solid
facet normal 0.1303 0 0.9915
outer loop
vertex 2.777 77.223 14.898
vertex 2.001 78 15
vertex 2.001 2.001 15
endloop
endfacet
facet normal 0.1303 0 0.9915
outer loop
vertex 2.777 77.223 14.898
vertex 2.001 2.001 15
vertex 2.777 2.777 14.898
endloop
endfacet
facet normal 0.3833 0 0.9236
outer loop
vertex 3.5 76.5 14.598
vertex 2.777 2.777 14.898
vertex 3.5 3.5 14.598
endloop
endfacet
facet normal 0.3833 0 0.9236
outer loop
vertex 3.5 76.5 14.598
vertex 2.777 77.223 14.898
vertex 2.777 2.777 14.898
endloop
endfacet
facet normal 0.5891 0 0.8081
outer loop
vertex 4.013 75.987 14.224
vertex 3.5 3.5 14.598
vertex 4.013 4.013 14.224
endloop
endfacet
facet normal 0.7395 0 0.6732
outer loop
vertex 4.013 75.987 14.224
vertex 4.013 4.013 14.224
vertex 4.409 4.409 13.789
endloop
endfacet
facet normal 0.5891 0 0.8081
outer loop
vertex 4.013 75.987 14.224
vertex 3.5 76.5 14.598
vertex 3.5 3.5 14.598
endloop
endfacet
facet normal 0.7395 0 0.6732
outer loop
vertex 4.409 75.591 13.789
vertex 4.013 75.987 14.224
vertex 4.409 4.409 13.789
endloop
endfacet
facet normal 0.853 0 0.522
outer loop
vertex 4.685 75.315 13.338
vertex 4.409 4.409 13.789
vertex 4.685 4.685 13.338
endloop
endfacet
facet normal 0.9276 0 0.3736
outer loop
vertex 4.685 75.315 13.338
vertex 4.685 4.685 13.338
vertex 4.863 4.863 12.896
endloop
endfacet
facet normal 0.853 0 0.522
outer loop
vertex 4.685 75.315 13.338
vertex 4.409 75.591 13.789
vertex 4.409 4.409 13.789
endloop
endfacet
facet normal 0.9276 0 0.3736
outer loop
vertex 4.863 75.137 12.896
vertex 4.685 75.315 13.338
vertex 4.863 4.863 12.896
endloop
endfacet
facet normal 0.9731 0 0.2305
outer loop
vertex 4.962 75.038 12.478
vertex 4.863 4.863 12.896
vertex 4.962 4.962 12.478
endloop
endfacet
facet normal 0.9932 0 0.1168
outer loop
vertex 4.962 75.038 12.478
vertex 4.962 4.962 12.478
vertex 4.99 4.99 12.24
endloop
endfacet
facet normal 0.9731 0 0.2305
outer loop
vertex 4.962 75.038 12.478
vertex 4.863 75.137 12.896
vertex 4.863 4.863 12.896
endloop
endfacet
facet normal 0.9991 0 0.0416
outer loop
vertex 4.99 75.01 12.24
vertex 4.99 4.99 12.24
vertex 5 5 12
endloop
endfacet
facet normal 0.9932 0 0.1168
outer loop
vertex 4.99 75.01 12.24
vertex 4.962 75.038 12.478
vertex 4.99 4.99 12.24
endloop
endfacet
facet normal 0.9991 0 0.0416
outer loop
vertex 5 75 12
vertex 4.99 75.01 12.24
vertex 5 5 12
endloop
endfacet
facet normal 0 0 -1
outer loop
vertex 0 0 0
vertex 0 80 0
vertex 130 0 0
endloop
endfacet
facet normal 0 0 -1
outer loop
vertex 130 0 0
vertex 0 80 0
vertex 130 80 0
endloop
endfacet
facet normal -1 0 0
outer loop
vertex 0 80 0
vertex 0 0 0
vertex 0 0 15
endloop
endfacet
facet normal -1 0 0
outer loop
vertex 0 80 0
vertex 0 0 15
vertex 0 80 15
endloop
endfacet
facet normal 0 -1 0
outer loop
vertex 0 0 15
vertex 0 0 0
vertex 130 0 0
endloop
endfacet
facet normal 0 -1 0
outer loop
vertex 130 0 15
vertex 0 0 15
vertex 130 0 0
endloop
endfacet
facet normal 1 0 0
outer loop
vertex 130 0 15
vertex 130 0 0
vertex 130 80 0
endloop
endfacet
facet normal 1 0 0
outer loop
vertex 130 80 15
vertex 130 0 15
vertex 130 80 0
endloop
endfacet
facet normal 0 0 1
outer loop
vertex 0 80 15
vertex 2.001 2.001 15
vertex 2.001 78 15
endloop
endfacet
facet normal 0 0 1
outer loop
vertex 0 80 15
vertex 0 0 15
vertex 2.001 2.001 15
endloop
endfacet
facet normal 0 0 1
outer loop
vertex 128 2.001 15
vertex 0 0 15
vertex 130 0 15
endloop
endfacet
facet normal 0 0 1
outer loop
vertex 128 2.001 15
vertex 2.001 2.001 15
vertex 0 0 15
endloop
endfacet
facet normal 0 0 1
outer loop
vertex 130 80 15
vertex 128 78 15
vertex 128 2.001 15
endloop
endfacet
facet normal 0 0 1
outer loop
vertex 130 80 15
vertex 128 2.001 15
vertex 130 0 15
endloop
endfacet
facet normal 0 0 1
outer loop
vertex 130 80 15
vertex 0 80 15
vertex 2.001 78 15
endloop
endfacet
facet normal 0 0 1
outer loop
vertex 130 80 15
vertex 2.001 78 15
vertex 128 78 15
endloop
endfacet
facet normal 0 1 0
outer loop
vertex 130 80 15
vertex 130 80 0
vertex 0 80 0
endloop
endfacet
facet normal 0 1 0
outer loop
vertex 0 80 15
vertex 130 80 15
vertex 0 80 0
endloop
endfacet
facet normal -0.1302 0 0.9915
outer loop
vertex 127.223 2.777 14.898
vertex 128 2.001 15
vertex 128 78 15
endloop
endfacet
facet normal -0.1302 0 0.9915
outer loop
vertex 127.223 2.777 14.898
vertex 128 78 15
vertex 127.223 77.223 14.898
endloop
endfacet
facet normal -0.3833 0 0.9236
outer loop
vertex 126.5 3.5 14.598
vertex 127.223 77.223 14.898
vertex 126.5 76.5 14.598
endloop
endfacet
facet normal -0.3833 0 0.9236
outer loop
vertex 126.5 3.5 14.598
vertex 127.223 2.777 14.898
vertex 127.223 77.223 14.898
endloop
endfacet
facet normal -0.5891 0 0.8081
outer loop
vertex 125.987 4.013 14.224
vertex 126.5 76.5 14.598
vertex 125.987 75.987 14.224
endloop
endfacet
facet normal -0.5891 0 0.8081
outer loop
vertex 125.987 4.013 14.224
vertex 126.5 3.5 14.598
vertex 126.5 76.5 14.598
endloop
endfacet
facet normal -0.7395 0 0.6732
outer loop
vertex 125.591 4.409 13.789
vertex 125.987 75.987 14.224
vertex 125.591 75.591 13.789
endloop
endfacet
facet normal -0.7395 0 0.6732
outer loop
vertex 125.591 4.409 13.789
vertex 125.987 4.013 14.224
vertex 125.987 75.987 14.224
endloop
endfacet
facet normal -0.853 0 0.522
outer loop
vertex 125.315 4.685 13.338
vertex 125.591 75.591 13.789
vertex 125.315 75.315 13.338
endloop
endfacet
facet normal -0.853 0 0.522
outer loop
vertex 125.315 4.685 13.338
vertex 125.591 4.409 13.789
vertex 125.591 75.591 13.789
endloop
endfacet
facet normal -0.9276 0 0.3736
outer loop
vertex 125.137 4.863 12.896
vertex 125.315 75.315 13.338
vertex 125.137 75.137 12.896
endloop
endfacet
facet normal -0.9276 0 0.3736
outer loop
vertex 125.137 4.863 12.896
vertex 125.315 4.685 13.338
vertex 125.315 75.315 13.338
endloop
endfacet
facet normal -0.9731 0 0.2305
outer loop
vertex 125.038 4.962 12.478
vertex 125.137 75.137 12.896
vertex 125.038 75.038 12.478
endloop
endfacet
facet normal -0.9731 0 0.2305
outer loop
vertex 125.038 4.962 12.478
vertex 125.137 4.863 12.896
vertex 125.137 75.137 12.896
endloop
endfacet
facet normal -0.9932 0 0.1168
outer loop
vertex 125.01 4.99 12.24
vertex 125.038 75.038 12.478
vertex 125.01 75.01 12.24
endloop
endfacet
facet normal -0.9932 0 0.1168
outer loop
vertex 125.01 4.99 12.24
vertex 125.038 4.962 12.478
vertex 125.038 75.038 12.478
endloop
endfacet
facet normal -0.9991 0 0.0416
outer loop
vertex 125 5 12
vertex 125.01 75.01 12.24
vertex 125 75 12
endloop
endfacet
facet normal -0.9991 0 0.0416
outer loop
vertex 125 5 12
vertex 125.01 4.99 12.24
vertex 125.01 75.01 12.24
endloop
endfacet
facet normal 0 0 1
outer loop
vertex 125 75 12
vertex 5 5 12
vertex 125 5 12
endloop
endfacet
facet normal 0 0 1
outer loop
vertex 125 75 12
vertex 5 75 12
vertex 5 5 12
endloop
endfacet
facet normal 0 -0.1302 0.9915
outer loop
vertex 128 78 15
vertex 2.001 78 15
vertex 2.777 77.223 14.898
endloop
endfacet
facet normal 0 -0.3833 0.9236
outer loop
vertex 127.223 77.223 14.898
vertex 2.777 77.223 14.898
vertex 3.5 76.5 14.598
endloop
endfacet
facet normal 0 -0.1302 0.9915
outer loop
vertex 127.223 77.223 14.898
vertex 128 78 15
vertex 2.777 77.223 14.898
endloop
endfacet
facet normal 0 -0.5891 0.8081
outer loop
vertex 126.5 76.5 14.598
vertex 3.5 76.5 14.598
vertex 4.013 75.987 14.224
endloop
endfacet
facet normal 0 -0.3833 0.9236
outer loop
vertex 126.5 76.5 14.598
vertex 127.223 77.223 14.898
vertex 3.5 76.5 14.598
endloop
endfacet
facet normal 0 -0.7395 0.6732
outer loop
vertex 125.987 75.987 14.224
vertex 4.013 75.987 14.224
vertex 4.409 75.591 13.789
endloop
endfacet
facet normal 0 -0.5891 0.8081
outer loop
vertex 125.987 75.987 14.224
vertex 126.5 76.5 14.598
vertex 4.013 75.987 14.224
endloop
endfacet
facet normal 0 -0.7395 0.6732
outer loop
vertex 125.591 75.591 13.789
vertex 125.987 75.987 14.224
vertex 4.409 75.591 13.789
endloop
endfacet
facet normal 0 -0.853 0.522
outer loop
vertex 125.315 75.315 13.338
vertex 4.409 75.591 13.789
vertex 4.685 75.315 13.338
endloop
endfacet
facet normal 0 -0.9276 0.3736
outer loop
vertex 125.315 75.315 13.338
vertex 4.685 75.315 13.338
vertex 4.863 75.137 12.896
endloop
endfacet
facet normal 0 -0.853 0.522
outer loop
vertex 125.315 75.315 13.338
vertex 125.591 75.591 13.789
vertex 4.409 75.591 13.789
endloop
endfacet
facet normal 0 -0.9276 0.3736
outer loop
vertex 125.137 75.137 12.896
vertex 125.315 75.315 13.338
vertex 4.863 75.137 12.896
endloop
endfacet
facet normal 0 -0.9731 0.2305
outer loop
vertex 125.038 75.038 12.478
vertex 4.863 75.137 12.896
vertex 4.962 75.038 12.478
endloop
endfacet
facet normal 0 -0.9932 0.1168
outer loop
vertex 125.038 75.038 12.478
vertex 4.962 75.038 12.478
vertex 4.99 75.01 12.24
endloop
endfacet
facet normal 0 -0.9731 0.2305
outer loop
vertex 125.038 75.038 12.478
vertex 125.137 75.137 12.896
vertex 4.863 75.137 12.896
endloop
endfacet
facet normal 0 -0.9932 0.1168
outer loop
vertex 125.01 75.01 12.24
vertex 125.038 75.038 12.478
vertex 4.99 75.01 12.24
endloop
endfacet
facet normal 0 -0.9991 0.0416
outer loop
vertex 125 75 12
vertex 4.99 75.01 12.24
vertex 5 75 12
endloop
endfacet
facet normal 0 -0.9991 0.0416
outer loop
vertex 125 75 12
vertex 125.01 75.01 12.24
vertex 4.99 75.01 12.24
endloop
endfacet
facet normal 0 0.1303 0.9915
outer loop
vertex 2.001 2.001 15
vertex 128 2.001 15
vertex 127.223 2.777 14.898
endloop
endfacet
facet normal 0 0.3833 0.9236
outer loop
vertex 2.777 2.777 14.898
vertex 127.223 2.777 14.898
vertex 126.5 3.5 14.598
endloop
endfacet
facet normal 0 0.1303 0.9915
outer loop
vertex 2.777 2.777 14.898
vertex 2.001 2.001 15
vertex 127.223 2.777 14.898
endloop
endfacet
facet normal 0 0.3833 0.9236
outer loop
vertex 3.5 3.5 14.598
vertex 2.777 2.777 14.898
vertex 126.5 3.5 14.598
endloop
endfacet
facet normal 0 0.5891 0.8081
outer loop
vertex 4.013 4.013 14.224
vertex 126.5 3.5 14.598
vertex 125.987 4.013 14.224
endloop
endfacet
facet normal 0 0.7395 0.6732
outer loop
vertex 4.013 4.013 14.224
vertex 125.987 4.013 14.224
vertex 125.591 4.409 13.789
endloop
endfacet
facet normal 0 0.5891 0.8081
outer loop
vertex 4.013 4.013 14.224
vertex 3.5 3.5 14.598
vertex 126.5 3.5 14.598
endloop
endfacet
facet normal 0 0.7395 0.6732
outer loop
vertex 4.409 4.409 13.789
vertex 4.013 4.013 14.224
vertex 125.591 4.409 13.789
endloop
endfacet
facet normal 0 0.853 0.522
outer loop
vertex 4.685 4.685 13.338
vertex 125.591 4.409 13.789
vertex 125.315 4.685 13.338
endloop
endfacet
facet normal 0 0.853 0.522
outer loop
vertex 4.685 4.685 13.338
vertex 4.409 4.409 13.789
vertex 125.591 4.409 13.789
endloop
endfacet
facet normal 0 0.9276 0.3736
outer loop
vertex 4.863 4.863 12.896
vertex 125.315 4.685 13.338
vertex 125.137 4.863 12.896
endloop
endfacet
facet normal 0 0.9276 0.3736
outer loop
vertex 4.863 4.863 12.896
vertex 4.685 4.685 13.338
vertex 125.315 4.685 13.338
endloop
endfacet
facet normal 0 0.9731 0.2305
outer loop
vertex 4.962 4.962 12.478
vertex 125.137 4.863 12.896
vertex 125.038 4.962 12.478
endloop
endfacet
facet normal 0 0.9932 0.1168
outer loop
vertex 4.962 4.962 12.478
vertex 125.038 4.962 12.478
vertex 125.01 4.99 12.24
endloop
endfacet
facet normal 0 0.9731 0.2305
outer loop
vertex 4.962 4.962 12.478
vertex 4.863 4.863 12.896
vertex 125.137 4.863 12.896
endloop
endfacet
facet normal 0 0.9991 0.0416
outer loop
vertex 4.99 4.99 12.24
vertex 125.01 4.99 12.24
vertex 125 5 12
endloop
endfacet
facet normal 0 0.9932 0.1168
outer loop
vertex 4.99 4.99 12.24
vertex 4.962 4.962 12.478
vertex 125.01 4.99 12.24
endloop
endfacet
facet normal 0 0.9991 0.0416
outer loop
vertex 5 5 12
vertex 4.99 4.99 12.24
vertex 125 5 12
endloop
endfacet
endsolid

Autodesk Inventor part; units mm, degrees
ref_plane "YZ Plane" through (0, 0, 0) normal (1, 0, 0) x (0, 1, 0)
ref_plane "XZ Plane" through (0, 0, 0) normal (0, 1, 0) x (-1, 0, 0)
ref_plane "XY Plane" through (0, 0, 0) normal (0, 0, 1) x (1, 0, 0)
sketch "Skizze2" plane through (0, 0, 0) normal (0, 0, 1) x (1, 0, 0)
  line L0 (-26, 0) -> (156, 0) projected
  line L1 (0, -16) -> (0, 96) projected
  line L2 (0, 0) -> (130, 0)
  line L3 (130, 0) -> (130, 80)
  line L4 (130, 80) -> (0, 80)
  line L5 (0, 80) -> (0, 0)
  point P0 (0, 80)
  dimension "d0" = 80
  dimension "d1" = 130
extrude "Extrusion1" add sketch "Skizze2" along normal blind 15
sketch "Skizze3" plane through (0, 0, 15) normal (0, 0, 1) x (1, 0, 0)
  line L0 (5, 75) -> (125, 75)
  line L1 (125, 75) -> (125, 5)
  line L2 (125, 5) -> (5, 5)
  line L3 (5, 5) -> (5, 75)
  line L4 (130, 80) -> (0, 80) projected
  line L5 (130, 0) -> (130, 80) projected
  line L6 (0, 0) -> (130, 0) projected
  line L7 (0, 80) -> (0, 0) projected
  dimension "d4" = 5
  dimension "d5" = 5
  dimension "d6" = 5
  dimension "d7" = 5
extrude "Extrusion2" cut sketch "Skizze3" against normal blind 3 contours L0 L1 L2 L3
fillet "Rundung1" radius 3 4 edges at (65, 75, 15) (5, 40, 15) (65, 5, 15) (125, 40, 15)
properties part number "Display_Dummy"
